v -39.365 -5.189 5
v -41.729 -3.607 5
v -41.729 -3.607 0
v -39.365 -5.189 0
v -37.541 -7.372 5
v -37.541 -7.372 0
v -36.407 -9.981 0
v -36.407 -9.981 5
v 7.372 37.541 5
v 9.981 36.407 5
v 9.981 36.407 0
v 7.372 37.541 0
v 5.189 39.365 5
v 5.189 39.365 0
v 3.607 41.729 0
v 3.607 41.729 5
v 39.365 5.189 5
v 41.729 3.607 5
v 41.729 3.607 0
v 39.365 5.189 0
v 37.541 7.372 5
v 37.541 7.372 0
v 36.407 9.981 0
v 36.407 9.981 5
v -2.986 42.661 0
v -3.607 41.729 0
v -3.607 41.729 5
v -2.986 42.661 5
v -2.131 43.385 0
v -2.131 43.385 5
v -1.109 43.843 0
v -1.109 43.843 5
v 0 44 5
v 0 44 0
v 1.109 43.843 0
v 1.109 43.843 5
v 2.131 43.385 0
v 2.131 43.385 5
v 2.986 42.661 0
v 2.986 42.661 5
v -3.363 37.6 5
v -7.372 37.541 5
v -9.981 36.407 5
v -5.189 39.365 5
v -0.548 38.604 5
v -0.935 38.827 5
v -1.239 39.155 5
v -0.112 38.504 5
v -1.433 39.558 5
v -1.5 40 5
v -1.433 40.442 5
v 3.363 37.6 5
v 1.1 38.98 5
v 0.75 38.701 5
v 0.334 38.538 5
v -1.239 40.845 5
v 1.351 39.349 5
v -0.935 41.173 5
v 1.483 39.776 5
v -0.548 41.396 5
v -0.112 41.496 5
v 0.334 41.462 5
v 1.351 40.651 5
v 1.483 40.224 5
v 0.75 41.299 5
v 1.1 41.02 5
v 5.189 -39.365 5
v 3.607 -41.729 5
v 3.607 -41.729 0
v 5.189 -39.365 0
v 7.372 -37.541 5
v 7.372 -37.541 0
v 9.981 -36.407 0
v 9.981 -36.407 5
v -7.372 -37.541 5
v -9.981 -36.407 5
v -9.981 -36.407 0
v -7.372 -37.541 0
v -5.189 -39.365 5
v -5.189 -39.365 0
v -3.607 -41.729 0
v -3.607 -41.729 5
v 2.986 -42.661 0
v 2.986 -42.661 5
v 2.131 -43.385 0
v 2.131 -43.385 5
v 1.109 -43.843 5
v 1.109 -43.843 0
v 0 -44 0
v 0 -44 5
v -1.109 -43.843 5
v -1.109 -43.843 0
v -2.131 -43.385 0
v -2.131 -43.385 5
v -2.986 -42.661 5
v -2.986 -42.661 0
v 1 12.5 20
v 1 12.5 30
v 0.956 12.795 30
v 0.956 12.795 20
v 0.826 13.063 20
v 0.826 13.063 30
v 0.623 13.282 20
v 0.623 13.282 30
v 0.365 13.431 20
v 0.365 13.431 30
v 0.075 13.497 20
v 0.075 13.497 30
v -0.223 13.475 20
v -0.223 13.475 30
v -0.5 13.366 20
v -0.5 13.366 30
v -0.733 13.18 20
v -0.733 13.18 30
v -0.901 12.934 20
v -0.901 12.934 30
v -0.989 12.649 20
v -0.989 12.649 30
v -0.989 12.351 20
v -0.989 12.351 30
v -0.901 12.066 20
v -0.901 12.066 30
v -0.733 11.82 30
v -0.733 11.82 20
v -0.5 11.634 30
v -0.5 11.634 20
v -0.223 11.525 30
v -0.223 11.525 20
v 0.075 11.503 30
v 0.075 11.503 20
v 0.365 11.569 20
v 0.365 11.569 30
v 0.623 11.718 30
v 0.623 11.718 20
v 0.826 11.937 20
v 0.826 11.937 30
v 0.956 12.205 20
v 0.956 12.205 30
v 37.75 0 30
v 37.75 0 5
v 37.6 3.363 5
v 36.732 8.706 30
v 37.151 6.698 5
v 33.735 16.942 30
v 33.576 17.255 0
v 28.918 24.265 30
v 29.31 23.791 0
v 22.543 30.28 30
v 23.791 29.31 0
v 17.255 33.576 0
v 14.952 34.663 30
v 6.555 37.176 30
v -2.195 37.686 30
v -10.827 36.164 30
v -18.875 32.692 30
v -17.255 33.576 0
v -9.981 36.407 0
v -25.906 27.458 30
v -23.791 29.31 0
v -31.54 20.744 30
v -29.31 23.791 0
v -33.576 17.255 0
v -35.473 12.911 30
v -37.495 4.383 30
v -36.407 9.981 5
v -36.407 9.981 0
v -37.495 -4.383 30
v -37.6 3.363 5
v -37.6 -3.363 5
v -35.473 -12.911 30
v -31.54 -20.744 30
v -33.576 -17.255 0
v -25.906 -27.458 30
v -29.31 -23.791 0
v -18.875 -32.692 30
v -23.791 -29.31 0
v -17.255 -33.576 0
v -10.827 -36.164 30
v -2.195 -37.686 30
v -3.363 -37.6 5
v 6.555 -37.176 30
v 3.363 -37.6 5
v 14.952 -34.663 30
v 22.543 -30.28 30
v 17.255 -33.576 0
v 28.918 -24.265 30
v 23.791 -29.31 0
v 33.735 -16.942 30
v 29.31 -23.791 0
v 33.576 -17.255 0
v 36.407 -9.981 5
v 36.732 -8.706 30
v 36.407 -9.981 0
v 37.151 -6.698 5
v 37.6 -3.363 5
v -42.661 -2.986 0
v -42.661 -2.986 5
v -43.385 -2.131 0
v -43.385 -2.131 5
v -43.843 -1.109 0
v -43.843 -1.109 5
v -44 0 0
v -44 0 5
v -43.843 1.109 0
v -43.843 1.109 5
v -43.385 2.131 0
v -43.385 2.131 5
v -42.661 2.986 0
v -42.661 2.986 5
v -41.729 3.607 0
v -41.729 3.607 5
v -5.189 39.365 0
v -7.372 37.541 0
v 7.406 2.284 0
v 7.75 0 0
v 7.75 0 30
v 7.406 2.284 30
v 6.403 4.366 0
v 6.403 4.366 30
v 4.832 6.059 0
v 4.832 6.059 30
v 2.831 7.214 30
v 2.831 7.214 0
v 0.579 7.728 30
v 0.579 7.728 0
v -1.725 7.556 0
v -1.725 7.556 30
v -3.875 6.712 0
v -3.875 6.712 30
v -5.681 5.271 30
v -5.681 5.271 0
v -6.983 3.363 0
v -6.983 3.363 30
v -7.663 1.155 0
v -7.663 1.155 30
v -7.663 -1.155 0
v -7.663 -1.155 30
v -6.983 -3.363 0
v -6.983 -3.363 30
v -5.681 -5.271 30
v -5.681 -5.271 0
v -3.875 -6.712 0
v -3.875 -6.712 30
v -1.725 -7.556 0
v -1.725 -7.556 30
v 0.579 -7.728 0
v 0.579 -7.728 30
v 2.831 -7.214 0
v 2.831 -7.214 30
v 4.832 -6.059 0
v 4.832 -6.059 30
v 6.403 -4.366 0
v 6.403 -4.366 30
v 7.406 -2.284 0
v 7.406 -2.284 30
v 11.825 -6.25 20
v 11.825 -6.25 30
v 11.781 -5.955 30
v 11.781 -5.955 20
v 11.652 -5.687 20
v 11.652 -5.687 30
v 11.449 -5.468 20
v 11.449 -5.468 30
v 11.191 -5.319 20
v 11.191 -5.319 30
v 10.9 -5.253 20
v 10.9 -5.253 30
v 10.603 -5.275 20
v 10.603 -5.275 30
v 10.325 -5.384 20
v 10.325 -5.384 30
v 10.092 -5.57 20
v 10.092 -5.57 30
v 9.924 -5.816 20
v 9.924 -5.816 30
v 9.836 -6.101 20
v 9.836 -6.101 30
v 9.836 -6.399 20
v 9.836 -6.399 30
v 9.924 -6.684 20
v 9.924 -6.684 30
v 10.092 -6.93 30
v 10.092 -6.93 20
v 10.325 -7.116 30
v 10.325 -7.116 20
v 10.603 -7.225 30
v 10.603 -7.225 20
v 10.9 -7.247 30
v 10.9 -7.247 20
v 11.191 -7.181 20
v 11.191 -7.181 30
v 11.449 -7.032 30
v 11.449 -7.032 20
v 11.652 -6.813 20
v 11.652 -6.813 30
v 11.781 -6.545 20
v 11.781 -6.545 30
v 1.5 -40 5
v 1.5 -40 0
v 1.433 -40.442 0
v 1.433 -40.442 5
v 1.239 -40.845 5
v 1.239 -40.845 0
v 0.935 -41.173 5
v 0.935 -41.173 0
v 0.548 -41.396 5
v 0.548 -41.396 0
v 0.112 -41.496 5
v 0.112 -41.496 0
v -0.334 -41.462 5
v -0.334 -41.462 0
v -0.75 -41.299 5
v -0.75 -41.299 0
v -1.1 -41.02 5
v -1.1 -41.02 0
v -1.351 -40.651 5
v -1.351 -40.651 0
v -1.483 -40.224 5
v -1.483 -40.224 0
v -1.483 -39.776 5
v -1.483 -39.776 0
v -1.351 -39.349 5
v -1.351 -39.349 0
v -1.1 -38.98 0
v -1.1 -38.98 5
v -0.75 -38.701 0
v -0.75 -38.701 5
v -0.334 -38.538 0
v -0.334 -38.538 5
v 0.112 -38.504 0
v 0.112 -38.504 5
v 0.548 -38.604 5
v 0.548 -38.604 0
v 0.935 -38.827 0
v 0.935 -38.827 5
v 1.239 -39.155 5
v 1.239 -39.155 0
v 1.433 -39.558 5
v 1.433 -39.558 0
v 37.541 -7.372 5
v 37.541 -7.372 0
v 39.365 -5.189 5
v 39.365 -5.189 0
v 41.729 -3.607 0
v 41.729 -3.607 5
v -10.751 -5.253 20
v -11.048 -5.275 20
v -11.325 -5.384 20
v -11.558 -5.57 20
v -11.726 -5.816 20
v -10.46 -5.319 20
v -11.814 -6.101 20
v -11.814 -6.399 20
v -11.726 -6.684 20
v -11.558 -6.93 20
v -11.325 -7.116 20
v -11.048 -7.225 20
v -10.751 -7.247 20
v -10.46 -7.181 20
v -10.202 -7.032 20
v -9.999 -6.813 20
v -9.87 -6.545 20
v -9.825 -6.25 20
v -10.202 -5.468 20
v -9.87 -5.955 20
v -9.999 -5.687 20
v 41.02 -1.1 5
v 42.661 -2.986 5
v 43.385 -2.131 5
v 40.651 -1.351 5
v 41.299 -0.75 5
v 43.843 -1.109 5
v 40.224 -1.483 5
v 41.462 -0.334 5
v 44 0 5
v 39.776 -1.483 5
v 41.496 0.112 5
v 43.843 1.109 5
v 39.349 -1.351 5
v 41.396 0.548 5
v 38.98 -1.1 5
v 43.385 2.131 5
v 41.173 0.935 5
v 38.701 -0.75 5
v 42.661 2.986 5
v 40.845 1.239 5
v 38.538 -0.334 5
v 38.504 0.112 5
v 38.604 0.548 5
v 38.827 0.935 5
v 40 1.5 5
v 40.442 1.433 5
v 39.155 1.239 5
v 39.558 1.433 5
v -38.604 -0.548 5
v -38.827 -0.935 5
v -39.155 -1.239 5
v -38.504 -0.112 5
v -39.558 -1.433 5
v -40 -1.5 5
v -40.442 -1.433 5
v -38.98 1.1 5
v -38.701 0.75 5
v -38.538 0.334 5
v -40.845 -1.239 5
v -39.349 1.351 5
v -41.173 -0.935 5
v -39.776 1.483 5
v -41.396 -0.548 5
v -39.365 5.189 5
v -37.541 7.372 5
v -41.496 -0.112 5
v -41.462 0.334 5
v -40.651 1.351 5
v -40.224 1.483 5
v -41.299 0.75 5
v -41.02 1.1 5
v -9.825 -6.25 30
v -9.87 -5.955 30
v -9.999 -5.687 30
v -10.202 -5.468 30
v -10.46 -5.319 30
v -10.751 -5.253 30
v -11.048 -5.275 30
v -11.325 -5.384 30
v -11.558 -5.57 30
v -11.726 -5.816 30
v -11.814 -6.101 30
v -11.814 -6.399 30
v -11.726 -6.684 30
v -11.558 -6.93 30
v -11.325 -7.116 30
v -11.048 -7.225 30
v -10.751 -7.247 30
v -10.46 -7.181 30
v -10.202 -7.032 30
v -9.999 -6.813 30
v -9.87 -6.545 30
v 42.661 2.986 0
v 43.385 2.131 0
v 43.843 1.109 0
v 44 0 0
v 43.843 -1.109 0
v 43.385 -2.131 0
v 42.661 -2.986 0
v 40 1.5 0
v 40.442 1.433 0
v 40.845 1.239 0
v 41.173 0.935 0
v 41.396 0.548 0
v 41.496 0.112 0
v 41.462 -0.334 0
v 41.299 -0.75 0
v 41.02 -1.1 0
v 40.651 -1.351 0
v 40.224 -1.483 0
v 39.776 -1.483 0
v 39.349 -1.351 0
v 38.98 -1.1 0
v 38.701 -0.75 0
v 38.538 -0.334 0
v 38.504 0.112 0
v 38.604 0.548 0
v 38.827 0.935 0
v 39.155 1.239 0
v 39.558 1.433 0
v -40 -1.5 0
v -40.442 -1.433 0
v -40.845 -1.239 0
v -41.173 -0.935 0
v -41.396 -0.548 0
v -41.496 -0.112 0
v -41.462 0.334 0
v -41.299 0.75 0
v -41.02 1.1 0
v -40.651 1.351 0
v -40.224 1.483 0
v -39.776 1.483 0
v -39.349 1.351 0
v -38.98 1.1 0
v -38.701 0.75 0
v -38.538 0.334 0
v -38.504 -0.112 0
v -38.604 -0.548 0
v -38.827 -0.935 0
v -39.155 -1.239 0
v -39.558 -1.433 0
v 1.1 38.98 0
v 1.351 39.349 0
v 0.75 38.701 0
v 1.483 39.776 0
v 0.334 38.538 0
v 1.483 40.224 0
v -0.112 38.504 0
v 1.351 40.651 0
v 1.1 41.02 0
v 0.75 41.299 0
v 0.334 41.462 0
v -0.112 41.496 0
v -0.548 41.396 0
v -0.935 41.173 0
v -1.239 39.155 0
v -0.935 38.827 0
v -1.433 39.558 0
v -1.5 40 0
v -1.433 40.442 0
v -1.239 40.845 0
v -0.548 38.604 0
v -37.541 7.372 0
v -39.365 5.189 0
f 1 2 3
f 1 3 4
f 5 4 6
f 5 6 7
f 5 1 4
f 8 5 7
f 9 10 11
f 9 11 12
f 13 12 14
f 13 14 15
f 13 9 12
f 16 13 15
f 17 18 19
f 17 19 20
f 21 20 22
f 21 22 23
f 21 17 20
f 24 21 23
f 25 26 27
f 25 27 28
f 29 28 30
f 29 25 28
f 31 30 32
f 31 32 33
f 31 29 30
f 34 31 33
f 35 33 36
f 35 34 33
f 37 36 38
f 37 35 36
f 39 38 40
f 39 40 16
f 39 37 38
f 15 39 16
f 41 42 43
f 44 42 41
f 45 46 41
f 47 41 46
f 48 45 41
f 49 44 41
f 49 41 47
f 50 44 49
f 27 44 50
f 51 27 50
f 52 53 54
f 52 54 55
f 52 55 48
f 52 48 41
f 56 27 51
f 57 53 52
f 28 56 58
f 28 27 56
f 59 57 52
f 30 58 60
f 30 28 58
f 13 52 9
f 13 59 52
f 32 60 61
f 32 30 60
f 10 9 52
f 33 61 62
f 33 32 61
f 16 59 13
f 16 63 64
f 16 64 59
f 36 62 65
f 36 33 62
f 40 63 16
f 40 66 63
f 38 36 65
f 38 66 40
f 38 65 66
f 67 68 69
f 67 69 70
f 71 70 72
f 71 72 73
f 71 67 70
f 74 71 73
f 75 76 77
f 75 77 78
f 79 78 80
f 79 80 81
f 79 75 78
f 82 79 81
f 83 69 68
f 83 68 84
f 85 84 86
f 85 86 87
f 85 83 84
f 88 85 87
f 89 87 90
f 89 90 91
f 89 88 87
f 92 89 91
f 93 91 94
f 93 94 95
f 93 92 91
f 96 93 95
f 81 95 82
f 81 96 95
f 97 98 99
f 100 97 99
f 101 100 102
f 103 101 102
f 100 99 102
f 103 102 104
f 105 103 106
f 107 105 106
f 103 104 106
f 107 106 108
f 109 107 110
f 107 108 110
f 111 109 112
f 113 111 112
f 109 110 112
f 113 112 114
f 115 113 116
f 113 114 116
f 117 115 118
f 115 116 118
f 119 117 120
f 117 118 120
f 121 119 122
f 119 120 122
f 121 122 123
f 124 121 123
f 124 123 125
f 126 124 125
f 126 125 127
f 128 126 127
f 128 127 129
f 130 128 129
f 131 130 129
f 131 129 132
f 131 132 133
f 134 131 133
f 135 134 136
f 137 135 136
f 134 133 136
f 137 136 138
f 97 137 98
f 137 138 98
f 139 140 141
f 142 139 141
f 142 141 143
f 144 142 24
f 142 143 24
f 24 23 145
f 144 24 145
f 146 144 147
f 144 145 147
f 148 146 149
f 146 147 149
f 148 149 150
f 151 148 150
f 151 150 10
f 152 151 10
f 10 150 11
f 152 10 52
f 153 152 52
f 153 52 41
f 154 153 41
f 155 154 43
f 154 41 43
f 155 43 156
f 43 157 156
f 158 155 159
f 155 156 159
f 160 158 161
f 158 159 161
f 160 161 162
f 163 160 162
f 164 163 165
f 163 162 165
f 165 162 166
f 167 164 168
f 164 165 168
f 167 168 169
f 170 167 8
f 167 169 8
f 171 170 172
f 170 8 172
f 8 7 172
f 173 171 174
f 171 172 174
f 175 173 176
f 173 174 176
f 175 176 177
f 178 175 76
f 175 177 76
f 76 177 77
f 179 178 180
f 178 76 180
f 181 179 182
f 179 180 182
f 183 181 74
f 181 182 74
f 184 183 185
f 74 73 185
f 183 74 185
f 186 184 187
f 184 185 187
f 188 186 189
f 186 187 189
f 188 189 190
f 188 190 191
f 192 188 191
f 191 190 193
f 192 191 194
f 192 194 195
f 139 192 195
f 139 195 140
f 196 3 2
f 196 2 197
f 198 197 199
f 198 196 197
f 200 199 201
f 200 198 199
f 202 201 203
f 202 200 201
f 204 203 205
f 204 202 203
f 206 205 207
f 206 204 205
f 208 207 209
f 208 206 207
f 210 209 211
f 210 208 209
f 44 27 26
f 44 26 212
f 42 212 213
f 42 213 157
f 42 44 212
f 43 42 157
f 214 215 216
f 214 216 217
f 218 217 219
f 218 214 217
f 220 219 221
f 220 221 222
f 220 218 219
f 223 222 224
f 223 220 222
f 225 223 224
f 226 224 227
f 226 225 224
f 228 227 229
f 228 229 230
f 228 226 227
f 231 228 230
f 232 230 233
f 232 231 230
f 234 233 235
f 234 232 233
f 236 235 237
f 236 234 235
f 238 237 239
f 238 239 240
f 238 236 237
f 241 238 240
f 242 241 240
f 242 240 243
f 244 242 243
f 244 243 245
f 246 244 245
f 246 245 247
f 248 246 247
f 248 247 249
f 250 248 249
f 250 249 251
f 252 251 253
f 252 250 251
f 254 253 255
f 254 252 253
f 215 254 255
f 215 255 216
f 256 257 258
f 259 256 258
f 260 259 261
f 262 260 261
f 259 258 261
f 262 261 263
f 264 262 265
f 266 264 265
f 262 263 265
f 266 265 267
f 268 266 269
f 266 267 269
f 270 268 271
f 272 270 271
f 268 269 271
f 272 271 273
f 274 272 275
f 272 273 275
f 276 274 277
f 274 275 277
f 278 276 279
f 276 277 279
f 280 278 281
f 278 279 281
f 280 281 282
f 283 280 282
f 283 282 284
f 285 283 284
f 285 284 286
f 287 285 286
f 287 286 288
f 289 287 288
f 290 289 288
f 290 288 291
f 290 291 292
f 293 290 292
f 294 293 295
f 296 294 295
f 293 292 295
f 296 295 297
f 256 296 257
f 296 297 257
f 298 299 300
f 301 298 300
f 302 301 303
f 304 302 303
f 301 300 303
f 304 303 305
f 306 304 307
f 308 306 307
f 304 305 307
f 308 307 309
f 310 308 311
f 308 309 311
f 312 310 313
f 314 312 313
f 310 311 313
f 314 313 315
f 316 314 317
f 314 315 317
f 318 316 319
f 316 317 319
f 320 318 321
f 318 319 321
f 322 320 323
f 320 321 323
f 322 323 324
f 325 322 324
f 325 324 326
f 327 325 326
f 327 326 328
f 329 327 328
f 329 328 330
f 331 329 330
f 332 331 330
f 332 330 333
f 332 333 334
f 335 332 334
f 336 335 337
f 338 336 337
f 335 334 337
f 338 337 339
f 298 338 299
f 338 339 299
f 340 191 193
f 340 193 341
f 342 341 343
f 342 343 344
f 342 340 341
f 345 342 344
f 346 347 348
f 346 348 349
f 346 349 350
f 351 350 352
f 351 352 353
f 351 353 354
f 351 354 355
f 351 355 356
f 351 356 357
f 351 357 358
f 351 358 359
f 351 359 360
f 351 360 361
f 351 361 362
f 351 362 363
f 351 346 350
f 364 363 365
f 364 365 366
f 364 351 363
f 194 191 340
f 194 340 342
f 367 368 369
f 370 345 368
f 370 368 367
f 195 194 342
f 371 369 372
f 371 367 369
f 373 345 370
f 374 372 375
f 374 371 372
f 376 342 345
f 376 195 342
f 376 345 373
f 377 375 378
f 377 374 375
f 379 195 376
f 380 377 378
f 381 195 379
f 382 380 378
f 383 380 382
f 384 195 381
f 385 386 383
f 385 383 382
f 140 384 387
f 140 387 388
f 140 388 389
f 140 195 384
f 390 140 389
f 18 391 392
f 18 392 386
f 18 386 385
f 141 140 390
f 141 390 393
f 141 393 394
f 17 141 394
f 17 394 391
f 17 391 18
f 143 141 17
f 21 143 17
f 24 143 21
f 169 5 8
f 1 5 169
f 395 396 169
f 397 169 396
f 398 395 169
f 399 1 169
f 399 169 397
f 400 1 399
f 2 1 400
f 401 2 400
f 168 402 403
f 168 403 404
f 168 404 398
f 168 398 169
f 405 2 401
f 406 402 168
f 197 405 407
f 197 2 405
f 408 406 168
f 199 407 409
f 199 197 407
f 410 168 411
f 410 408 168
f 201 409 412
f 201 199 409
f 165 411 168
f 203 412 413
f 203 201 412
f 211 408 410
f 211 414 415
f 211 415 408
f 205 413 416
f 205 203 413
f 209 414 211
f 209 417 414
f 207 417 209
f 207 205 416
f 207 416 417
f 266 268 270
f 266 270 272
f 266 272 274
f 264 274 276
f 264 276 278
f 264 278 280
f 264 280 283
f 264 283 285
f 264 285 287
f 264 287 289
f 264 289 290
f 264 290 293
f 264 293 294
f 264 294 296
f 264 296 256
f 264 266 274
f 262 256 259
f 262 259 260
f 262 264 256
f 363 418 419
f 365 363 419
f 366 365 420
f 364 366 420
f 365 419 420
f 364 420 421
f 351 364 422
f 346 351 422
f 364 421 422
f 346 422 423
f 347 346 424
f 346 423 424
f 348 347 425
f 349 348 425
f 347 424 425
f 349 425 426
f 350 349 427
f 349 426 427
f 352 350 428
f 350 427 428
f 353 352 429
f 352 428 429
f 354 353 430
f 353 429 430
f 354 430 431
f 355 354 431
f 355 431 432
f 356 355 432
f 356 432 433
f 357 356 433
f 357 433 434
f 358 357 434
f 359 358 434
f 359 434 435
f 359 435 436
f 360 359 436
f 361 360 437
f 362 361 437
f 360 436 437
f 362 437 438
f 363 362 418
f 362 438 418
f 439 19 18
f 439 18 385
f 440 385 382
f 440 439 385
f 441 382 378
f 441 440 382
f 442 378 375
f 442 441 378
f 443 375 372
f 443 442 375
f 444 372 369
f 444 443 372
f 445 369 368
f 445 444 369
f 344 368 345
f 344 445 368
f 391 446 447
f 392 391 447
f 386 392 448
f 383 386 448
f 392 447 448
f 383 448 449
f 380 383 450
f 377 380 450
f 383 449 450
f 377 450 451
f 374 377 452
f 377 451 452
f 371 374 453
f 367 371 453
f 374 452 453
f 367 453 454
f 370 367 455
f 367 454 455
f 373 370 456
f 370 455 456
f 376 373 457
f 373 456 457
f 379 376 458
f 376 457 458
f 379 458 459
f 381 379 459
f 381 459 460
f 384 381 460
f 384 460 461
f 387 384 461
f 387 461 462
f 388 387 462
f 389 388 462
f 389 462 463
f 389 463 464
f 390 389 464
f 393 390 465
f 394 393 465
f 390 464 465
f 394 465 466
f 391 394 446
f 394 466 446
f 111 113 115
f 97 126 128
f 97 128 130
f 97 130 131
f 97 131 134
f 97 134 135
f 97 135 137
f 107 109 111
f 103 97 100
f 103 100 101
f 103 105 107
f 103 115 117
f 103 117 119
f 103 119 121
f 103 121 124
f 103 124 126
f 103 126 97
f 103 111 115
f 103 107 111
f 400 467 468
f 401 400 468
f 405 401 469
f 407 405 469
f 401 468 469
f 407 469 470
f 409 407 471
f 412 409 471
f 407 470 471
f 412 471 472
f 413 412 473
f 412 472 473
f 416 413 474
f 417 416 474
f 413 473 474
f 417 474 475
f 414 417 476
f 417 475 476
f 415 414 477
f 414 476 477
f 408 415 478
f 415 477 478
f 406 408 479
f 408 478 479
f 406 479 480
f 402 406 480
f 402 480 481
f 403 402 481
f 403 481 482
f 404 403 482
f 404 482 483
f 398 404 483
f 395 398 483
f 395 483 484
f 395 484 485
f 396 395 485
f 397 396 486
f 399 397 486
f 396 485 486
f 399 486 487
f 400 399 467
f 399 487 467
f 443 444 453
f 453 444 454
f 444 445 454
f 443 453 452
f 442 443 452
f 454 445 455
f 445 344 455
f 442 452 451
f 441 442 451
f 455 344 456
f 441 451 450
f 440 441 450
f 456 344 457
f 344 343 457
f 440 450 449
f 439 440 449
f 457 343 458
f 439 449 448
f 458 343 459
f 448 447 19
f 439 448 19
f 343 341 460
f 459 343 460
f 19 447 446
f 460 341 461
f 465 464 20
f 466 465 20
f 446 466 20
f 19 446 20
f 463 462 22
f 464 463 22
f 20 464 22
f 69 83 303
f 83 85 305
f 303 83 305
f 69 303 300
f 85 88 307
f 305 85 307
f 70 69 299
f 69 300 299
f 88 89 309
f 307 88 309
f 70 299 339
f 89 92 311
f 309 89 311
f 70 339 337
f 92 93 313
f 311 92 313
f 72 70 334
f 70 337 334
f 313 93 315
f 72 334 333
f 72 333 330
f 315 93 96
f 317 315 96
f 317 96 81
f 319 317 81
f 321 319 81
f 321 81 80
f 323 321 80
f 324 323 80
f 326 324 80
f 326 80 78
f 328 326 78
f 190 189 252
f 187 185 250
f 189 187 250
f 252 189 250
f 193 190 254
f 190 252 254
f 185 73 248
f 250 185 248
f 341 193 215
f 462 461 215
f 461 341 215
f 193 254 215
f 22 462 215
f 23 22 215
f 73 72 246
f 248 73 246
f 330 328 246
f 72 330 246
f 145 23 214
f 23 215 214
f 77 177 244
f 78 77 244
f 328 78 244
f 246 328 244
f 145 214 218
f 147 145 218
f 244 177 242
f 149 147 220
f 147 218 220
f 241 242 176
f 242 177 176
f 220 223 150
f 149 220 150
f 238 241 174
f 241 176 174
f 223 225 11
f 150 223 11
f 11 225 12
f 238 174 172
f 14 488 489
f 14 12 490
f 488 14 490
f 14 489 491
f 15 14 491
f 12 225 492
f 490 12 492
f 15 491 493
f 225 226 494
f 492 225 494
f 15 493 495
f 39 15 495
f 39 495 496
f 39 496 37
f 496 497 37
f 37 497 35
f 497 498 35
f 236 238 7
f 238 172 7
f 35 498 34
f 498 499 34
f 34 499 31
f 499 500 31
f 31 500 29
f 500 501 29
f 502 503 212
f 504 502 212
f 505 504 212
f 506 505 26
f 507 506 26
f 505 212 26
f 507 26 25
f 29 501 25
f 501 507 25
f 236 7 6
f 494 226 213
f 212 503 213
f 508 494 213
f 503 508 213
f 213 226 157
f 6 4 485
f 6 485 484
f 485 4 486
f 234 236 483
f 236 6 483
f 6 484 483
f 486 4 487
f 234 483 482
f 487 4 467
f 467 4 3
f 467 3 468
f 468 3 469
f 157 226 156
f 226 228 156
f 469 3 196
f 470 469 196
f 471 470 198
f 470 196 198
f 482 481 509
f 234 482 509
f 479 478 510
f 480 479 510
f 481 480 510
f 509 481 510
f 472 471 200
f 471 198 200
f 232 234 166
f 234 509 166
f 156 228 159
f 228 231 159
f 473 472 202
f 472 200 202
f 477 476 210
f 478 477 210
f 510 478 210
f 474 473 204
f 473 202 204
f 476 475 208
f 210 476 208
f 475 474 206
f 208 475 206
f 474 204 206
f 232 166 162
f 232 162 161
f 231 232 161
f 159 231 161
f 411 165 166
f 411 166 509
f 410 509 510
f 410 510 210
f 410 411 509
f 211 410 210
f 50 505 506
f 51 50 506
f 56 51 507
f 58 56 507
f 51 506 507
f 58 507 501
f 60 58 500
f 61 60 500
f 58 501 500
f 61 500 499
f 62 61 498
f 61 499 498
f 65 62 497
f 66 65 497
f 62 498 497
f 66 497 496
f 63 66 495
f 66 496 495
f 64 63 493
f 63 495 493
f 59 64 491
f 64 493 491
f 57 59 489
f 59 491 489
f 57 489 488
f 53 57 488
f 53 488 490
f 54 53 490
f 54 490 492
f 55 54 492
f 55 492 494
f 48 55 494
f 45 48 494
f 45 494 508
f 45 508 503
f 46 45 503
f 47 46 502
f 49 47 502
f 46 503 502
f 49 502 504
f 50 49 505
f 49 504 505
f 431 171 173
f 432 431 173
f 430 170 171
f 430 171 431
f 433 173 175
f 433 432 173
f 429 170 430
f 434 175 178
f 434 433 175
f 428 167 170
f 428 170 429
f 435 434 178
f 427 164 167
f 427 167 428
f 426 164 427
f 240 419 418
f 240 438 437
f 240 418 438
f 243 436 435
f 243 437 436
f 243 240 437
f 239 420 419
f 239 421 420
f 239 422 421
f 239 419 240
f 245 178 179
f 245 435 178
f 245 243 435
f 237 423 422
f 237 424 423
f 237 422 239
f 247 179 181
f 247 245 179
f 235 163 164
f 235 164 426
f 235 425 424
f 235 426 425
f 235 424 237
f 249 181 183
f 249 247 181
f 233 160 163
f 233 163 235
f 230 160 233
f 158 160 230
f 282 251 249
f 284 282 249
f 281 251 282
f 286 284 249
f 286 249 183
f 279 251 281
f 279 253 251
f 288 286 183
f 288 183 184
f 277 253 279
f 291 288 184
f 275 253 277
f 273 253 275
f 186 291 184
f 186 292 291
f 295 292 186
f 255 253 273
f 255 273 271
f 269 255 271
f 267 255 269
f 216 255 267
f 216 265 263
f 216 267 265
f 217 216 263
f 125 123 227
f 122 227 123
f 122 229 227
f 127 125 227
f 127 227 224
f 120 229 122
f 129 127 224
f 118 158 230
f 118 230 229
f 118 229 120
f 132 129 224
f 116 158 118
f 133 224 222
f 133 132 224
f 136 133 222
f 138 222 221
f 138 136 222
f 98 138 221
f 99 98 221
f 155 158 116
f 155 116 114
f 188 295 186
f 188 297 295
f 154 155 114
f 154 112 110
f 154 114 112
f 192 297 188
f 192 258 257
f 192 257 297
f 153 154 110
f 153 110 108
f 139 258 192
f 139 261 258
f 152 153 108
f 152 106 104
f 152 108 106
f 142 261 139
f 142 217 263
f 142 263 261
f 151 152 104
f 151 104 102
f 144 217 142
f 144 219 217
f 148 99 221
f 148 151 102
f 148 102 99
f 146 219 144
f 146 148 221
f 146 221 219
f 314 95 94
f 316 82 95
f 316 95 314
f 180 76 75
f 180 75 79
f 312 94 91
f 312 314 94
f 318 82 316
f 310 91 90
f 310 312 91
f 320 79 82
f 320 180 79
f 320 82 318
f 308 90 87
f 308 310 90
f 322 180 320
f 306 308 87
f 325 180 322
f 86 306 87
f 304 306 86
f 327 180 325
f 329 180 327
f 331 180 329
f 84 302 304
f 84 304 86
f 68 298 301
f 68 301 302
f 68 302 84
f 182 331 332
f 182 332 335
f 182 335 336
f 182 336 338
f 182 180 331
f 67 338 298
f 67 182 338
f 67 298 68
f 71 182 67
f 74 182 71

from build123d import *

# Parameters (mm, degrees)
SKETCH2_R                = 37.75
SKETCH2_R_2              = 7.75
BOSS_EXTRUDE1_DEPTH      = 30
SKETCH3_R                = 1
CUT_EXTRUDE1_DEPTH       = 10
SKETCH4_R                = 1.5
BOSS_EXTRUDE2_DEPTH      = 5
FILLET1_R                = 10
CIRPATTERN1_COUNT        = 4
FILLET1_OF_CIRPATTERN1_R = 10


with BuildPart() as part:
    # Sketch2 → Boss-Extrude1 (new body)
    with BuildSketch(Plane.XY):
        Circle(SKETCH2_R)
        Circle(SKETCH2_R_2, mode=Mode.SUBTRACT)
    extrude(amount=BOSS_EXTRUDE1_DEPTH)

    # Sketch3 → Cut-Extrude1 (cut)
    with BuildSketch(Plane.XY.offset(30)):
        with Locations((0, 12.5)):
            Circle(SKETCH3_R)
        with Locations((10.825317547, -6.25)):
            Circle(SKETCH3_R)
        with Locations((-10.825317547, -6.25)):
            Circle(SKETCH3_R)
    extrude(amount=-CUT_EXTRUDE1_DEPTH, mode=Mode.SUBTRACT)

    # Sketch4 → Boss-Extrude2 (add)
    with BuildSketch(Plane(origin=(0, 0, 0), x_dir=(-1, 0, 0), z_dir=(0, 0, -1))):
        with BuildLine():
            Line((-4, 37.495028442), (0, 37.75))
            Line((0, 37.75), (4, 37.495028442))
            Line((4, 37.495028442), (4, 40))
            ThreePointArc((4, 40), (0, 44), (-4, 40))
            Line((-4, 40), (-4, 37.495028442))
        make_face()
        with Locations((0, 40)):
            Circle(SKETCH4_R, mode=Mode.SUBTRACT)
    boss_extrude2 = extrude(amount=-BOSS_EXTRUDE2_DEPTH)

    # Fillet1
    # the kernel refuses this fillet: 10 mm, written as the material it adds along each edge
    with BuildSketch(Plane(origin=(4, 37.537481269, 5), x_dir=(0.9825908408243521, -0.18578277511139904, 0), z_dir=(0, 0, -1))) as fillet1_piece_1:
        with BuildLine():
            CenterArc((6.893121156, -9.967448048), FILLET1_R, 94.624278966, 49.061773925)
            Line((-1.164720332, -4.045354621), (-1.970504481, -3.453145278))
            ThreePointArc((-1.970504481, -3.453145278), (-1.440084404, -2.233865576), (-0.982590841, 0.185782775))
            Line((-0.982590841, 0.185782775), (0.0806213, 0.996744805))
            ThreePointArc((0.0806213, 0.996744805), (3.043454077, 0.877116383), (6.006286855, 0.996744805))
            Line((6.006286855, 0.996744805), (6.086908155, 0))
        make_face()
    extrude(amount=5)
    with BuildSketch(Plane(origin=(-4, 37.537481269, 5), x_dir=(-0.9825908408243521, -0.185782775111399, 0), z_dir=(0, 0, -1))) as fillet1_piece_2:
        with BuildLine():
            CenterArc((6.893121156, 9.967448048), FILLET1_R, 216.31394711, 49.061773925)
            Line((-1.164720332, 4.045354621), (-1.970504481, 3.453145278))
            ThreePointArc((-1.970504481, 3.453145278), (-1.440084404, 2.233865576), (-0.982590841, -0.185782775))
            Line((-0.982590841, -0.185782775), (0.0806213, -0.996744805))
            ThreePointArc((0.0806213, -0.996744805), (3.043454077, -0.877116383), (6.006286855, -0.996744805))
            Line((6.006286855, -0.996744805), (6.086908155, 0))
        make_face()
    extrude(amount=5)

    # CirPattern1: Boss-Extrude2 ×4 about axis
    cirpattern1_axis = Axis((0, 0, 0), (0, 0, 1))
    for i in range(1, CIRPATTERN1_COUNT):
        add(boss_extrude2.rotate(cirpattern1_axis, i * 360 / CIRPATTERN1_COUNT))

    # Fillet1 of CirPattern1
    # the kernel refuses this fillet: 10 mm, written as the material it adds along each edge
    with BuildSketch(Plane(origin=(-37.537481269, 4, 5), x_dir=(0.18578277511140276, 0.9825908408243514, 0), z_dir=(0, 0, -1)), Plane(origin=(-4, -37.537481269, 5), x_dir=(-0.9825908408243512, 0.18578277511140392, 0), z_dir=(0, 0, -1)), Plane(origin=(37.537481269, -4, 5), x_dir=(-0.1857827751114012, -0.9825908408243518, 0), z_dir=(0, 0, -1))) as fillet1_of_cirpattern1_piece_1:
        with BuildLine():
            CenterArc((6.893121156, -9.967448048), FILLET1_OF_CIRPATTERN1_R, 94.624278966, 49.061773925)
            Line((-1.164720332, -4.045354621), (-1.970504481, -3.453145278))
            ThreePointArc((-1.970504481, -3.453145278), (-1.440084404, -2.233865576), (-0.982590841, 0.185782775))
            Line((-0.982590841, 0.185782775), (0.0806213, 0.996744805))
            ThreePointArc((0.0806213, 0.996744805), (3.043454077, 0.877116383), (6.006286855, 0.996744805))
            Line((6.006286855, 0.996744805), (6.086908155, 0))
        make_face()
    extrude(amount=5)
    with BuildSketch(Plane(origin=(-37.537481269, -4, 5), x_dir=(0.1857827751113977, -0.9825908408243523, 0), z_dir=(0, 0, -1)), Plane(origin=(4, -37.537481269, 5), x_dir=(0.9825908408243529, 0.18578277511139504, 0), z_dir=(0, 0, -1)), Plane(origin=(37.537481269, 4, 5), x_dir=(-0.18578277511139632, 0.9825908408243527, 0), z_dir=(0, 0, -1))) as fillet1_of_cirpattern1_piece_2:
        with BuildLine():
            CenterArc((6.893121156, 9.967448048), FILLET1_OF_CIRPATTERN1_R, 216.31394711, 49.061773925)
            Line((-1.164720332, 4.045354621), (-1.970504481, 3.453145278))
            ThreePointArc((-1.970504481, 3.453145278), (-1.440084404, 2.233865576), (-0.982590841, -0.185782775))
            Line((-0.982590841, -0.185782775), (0.0806213, -0.996744805))
            ThreePointArc((0.0806213, -0.996744805), (3.043454077, -0.877116383), (6.006286855, -0.996744805))
            Line((6.006286855, -0.996744805), (6.086908155, 0))
        make_face()
    extrude(amount=5)


solid = part.part
